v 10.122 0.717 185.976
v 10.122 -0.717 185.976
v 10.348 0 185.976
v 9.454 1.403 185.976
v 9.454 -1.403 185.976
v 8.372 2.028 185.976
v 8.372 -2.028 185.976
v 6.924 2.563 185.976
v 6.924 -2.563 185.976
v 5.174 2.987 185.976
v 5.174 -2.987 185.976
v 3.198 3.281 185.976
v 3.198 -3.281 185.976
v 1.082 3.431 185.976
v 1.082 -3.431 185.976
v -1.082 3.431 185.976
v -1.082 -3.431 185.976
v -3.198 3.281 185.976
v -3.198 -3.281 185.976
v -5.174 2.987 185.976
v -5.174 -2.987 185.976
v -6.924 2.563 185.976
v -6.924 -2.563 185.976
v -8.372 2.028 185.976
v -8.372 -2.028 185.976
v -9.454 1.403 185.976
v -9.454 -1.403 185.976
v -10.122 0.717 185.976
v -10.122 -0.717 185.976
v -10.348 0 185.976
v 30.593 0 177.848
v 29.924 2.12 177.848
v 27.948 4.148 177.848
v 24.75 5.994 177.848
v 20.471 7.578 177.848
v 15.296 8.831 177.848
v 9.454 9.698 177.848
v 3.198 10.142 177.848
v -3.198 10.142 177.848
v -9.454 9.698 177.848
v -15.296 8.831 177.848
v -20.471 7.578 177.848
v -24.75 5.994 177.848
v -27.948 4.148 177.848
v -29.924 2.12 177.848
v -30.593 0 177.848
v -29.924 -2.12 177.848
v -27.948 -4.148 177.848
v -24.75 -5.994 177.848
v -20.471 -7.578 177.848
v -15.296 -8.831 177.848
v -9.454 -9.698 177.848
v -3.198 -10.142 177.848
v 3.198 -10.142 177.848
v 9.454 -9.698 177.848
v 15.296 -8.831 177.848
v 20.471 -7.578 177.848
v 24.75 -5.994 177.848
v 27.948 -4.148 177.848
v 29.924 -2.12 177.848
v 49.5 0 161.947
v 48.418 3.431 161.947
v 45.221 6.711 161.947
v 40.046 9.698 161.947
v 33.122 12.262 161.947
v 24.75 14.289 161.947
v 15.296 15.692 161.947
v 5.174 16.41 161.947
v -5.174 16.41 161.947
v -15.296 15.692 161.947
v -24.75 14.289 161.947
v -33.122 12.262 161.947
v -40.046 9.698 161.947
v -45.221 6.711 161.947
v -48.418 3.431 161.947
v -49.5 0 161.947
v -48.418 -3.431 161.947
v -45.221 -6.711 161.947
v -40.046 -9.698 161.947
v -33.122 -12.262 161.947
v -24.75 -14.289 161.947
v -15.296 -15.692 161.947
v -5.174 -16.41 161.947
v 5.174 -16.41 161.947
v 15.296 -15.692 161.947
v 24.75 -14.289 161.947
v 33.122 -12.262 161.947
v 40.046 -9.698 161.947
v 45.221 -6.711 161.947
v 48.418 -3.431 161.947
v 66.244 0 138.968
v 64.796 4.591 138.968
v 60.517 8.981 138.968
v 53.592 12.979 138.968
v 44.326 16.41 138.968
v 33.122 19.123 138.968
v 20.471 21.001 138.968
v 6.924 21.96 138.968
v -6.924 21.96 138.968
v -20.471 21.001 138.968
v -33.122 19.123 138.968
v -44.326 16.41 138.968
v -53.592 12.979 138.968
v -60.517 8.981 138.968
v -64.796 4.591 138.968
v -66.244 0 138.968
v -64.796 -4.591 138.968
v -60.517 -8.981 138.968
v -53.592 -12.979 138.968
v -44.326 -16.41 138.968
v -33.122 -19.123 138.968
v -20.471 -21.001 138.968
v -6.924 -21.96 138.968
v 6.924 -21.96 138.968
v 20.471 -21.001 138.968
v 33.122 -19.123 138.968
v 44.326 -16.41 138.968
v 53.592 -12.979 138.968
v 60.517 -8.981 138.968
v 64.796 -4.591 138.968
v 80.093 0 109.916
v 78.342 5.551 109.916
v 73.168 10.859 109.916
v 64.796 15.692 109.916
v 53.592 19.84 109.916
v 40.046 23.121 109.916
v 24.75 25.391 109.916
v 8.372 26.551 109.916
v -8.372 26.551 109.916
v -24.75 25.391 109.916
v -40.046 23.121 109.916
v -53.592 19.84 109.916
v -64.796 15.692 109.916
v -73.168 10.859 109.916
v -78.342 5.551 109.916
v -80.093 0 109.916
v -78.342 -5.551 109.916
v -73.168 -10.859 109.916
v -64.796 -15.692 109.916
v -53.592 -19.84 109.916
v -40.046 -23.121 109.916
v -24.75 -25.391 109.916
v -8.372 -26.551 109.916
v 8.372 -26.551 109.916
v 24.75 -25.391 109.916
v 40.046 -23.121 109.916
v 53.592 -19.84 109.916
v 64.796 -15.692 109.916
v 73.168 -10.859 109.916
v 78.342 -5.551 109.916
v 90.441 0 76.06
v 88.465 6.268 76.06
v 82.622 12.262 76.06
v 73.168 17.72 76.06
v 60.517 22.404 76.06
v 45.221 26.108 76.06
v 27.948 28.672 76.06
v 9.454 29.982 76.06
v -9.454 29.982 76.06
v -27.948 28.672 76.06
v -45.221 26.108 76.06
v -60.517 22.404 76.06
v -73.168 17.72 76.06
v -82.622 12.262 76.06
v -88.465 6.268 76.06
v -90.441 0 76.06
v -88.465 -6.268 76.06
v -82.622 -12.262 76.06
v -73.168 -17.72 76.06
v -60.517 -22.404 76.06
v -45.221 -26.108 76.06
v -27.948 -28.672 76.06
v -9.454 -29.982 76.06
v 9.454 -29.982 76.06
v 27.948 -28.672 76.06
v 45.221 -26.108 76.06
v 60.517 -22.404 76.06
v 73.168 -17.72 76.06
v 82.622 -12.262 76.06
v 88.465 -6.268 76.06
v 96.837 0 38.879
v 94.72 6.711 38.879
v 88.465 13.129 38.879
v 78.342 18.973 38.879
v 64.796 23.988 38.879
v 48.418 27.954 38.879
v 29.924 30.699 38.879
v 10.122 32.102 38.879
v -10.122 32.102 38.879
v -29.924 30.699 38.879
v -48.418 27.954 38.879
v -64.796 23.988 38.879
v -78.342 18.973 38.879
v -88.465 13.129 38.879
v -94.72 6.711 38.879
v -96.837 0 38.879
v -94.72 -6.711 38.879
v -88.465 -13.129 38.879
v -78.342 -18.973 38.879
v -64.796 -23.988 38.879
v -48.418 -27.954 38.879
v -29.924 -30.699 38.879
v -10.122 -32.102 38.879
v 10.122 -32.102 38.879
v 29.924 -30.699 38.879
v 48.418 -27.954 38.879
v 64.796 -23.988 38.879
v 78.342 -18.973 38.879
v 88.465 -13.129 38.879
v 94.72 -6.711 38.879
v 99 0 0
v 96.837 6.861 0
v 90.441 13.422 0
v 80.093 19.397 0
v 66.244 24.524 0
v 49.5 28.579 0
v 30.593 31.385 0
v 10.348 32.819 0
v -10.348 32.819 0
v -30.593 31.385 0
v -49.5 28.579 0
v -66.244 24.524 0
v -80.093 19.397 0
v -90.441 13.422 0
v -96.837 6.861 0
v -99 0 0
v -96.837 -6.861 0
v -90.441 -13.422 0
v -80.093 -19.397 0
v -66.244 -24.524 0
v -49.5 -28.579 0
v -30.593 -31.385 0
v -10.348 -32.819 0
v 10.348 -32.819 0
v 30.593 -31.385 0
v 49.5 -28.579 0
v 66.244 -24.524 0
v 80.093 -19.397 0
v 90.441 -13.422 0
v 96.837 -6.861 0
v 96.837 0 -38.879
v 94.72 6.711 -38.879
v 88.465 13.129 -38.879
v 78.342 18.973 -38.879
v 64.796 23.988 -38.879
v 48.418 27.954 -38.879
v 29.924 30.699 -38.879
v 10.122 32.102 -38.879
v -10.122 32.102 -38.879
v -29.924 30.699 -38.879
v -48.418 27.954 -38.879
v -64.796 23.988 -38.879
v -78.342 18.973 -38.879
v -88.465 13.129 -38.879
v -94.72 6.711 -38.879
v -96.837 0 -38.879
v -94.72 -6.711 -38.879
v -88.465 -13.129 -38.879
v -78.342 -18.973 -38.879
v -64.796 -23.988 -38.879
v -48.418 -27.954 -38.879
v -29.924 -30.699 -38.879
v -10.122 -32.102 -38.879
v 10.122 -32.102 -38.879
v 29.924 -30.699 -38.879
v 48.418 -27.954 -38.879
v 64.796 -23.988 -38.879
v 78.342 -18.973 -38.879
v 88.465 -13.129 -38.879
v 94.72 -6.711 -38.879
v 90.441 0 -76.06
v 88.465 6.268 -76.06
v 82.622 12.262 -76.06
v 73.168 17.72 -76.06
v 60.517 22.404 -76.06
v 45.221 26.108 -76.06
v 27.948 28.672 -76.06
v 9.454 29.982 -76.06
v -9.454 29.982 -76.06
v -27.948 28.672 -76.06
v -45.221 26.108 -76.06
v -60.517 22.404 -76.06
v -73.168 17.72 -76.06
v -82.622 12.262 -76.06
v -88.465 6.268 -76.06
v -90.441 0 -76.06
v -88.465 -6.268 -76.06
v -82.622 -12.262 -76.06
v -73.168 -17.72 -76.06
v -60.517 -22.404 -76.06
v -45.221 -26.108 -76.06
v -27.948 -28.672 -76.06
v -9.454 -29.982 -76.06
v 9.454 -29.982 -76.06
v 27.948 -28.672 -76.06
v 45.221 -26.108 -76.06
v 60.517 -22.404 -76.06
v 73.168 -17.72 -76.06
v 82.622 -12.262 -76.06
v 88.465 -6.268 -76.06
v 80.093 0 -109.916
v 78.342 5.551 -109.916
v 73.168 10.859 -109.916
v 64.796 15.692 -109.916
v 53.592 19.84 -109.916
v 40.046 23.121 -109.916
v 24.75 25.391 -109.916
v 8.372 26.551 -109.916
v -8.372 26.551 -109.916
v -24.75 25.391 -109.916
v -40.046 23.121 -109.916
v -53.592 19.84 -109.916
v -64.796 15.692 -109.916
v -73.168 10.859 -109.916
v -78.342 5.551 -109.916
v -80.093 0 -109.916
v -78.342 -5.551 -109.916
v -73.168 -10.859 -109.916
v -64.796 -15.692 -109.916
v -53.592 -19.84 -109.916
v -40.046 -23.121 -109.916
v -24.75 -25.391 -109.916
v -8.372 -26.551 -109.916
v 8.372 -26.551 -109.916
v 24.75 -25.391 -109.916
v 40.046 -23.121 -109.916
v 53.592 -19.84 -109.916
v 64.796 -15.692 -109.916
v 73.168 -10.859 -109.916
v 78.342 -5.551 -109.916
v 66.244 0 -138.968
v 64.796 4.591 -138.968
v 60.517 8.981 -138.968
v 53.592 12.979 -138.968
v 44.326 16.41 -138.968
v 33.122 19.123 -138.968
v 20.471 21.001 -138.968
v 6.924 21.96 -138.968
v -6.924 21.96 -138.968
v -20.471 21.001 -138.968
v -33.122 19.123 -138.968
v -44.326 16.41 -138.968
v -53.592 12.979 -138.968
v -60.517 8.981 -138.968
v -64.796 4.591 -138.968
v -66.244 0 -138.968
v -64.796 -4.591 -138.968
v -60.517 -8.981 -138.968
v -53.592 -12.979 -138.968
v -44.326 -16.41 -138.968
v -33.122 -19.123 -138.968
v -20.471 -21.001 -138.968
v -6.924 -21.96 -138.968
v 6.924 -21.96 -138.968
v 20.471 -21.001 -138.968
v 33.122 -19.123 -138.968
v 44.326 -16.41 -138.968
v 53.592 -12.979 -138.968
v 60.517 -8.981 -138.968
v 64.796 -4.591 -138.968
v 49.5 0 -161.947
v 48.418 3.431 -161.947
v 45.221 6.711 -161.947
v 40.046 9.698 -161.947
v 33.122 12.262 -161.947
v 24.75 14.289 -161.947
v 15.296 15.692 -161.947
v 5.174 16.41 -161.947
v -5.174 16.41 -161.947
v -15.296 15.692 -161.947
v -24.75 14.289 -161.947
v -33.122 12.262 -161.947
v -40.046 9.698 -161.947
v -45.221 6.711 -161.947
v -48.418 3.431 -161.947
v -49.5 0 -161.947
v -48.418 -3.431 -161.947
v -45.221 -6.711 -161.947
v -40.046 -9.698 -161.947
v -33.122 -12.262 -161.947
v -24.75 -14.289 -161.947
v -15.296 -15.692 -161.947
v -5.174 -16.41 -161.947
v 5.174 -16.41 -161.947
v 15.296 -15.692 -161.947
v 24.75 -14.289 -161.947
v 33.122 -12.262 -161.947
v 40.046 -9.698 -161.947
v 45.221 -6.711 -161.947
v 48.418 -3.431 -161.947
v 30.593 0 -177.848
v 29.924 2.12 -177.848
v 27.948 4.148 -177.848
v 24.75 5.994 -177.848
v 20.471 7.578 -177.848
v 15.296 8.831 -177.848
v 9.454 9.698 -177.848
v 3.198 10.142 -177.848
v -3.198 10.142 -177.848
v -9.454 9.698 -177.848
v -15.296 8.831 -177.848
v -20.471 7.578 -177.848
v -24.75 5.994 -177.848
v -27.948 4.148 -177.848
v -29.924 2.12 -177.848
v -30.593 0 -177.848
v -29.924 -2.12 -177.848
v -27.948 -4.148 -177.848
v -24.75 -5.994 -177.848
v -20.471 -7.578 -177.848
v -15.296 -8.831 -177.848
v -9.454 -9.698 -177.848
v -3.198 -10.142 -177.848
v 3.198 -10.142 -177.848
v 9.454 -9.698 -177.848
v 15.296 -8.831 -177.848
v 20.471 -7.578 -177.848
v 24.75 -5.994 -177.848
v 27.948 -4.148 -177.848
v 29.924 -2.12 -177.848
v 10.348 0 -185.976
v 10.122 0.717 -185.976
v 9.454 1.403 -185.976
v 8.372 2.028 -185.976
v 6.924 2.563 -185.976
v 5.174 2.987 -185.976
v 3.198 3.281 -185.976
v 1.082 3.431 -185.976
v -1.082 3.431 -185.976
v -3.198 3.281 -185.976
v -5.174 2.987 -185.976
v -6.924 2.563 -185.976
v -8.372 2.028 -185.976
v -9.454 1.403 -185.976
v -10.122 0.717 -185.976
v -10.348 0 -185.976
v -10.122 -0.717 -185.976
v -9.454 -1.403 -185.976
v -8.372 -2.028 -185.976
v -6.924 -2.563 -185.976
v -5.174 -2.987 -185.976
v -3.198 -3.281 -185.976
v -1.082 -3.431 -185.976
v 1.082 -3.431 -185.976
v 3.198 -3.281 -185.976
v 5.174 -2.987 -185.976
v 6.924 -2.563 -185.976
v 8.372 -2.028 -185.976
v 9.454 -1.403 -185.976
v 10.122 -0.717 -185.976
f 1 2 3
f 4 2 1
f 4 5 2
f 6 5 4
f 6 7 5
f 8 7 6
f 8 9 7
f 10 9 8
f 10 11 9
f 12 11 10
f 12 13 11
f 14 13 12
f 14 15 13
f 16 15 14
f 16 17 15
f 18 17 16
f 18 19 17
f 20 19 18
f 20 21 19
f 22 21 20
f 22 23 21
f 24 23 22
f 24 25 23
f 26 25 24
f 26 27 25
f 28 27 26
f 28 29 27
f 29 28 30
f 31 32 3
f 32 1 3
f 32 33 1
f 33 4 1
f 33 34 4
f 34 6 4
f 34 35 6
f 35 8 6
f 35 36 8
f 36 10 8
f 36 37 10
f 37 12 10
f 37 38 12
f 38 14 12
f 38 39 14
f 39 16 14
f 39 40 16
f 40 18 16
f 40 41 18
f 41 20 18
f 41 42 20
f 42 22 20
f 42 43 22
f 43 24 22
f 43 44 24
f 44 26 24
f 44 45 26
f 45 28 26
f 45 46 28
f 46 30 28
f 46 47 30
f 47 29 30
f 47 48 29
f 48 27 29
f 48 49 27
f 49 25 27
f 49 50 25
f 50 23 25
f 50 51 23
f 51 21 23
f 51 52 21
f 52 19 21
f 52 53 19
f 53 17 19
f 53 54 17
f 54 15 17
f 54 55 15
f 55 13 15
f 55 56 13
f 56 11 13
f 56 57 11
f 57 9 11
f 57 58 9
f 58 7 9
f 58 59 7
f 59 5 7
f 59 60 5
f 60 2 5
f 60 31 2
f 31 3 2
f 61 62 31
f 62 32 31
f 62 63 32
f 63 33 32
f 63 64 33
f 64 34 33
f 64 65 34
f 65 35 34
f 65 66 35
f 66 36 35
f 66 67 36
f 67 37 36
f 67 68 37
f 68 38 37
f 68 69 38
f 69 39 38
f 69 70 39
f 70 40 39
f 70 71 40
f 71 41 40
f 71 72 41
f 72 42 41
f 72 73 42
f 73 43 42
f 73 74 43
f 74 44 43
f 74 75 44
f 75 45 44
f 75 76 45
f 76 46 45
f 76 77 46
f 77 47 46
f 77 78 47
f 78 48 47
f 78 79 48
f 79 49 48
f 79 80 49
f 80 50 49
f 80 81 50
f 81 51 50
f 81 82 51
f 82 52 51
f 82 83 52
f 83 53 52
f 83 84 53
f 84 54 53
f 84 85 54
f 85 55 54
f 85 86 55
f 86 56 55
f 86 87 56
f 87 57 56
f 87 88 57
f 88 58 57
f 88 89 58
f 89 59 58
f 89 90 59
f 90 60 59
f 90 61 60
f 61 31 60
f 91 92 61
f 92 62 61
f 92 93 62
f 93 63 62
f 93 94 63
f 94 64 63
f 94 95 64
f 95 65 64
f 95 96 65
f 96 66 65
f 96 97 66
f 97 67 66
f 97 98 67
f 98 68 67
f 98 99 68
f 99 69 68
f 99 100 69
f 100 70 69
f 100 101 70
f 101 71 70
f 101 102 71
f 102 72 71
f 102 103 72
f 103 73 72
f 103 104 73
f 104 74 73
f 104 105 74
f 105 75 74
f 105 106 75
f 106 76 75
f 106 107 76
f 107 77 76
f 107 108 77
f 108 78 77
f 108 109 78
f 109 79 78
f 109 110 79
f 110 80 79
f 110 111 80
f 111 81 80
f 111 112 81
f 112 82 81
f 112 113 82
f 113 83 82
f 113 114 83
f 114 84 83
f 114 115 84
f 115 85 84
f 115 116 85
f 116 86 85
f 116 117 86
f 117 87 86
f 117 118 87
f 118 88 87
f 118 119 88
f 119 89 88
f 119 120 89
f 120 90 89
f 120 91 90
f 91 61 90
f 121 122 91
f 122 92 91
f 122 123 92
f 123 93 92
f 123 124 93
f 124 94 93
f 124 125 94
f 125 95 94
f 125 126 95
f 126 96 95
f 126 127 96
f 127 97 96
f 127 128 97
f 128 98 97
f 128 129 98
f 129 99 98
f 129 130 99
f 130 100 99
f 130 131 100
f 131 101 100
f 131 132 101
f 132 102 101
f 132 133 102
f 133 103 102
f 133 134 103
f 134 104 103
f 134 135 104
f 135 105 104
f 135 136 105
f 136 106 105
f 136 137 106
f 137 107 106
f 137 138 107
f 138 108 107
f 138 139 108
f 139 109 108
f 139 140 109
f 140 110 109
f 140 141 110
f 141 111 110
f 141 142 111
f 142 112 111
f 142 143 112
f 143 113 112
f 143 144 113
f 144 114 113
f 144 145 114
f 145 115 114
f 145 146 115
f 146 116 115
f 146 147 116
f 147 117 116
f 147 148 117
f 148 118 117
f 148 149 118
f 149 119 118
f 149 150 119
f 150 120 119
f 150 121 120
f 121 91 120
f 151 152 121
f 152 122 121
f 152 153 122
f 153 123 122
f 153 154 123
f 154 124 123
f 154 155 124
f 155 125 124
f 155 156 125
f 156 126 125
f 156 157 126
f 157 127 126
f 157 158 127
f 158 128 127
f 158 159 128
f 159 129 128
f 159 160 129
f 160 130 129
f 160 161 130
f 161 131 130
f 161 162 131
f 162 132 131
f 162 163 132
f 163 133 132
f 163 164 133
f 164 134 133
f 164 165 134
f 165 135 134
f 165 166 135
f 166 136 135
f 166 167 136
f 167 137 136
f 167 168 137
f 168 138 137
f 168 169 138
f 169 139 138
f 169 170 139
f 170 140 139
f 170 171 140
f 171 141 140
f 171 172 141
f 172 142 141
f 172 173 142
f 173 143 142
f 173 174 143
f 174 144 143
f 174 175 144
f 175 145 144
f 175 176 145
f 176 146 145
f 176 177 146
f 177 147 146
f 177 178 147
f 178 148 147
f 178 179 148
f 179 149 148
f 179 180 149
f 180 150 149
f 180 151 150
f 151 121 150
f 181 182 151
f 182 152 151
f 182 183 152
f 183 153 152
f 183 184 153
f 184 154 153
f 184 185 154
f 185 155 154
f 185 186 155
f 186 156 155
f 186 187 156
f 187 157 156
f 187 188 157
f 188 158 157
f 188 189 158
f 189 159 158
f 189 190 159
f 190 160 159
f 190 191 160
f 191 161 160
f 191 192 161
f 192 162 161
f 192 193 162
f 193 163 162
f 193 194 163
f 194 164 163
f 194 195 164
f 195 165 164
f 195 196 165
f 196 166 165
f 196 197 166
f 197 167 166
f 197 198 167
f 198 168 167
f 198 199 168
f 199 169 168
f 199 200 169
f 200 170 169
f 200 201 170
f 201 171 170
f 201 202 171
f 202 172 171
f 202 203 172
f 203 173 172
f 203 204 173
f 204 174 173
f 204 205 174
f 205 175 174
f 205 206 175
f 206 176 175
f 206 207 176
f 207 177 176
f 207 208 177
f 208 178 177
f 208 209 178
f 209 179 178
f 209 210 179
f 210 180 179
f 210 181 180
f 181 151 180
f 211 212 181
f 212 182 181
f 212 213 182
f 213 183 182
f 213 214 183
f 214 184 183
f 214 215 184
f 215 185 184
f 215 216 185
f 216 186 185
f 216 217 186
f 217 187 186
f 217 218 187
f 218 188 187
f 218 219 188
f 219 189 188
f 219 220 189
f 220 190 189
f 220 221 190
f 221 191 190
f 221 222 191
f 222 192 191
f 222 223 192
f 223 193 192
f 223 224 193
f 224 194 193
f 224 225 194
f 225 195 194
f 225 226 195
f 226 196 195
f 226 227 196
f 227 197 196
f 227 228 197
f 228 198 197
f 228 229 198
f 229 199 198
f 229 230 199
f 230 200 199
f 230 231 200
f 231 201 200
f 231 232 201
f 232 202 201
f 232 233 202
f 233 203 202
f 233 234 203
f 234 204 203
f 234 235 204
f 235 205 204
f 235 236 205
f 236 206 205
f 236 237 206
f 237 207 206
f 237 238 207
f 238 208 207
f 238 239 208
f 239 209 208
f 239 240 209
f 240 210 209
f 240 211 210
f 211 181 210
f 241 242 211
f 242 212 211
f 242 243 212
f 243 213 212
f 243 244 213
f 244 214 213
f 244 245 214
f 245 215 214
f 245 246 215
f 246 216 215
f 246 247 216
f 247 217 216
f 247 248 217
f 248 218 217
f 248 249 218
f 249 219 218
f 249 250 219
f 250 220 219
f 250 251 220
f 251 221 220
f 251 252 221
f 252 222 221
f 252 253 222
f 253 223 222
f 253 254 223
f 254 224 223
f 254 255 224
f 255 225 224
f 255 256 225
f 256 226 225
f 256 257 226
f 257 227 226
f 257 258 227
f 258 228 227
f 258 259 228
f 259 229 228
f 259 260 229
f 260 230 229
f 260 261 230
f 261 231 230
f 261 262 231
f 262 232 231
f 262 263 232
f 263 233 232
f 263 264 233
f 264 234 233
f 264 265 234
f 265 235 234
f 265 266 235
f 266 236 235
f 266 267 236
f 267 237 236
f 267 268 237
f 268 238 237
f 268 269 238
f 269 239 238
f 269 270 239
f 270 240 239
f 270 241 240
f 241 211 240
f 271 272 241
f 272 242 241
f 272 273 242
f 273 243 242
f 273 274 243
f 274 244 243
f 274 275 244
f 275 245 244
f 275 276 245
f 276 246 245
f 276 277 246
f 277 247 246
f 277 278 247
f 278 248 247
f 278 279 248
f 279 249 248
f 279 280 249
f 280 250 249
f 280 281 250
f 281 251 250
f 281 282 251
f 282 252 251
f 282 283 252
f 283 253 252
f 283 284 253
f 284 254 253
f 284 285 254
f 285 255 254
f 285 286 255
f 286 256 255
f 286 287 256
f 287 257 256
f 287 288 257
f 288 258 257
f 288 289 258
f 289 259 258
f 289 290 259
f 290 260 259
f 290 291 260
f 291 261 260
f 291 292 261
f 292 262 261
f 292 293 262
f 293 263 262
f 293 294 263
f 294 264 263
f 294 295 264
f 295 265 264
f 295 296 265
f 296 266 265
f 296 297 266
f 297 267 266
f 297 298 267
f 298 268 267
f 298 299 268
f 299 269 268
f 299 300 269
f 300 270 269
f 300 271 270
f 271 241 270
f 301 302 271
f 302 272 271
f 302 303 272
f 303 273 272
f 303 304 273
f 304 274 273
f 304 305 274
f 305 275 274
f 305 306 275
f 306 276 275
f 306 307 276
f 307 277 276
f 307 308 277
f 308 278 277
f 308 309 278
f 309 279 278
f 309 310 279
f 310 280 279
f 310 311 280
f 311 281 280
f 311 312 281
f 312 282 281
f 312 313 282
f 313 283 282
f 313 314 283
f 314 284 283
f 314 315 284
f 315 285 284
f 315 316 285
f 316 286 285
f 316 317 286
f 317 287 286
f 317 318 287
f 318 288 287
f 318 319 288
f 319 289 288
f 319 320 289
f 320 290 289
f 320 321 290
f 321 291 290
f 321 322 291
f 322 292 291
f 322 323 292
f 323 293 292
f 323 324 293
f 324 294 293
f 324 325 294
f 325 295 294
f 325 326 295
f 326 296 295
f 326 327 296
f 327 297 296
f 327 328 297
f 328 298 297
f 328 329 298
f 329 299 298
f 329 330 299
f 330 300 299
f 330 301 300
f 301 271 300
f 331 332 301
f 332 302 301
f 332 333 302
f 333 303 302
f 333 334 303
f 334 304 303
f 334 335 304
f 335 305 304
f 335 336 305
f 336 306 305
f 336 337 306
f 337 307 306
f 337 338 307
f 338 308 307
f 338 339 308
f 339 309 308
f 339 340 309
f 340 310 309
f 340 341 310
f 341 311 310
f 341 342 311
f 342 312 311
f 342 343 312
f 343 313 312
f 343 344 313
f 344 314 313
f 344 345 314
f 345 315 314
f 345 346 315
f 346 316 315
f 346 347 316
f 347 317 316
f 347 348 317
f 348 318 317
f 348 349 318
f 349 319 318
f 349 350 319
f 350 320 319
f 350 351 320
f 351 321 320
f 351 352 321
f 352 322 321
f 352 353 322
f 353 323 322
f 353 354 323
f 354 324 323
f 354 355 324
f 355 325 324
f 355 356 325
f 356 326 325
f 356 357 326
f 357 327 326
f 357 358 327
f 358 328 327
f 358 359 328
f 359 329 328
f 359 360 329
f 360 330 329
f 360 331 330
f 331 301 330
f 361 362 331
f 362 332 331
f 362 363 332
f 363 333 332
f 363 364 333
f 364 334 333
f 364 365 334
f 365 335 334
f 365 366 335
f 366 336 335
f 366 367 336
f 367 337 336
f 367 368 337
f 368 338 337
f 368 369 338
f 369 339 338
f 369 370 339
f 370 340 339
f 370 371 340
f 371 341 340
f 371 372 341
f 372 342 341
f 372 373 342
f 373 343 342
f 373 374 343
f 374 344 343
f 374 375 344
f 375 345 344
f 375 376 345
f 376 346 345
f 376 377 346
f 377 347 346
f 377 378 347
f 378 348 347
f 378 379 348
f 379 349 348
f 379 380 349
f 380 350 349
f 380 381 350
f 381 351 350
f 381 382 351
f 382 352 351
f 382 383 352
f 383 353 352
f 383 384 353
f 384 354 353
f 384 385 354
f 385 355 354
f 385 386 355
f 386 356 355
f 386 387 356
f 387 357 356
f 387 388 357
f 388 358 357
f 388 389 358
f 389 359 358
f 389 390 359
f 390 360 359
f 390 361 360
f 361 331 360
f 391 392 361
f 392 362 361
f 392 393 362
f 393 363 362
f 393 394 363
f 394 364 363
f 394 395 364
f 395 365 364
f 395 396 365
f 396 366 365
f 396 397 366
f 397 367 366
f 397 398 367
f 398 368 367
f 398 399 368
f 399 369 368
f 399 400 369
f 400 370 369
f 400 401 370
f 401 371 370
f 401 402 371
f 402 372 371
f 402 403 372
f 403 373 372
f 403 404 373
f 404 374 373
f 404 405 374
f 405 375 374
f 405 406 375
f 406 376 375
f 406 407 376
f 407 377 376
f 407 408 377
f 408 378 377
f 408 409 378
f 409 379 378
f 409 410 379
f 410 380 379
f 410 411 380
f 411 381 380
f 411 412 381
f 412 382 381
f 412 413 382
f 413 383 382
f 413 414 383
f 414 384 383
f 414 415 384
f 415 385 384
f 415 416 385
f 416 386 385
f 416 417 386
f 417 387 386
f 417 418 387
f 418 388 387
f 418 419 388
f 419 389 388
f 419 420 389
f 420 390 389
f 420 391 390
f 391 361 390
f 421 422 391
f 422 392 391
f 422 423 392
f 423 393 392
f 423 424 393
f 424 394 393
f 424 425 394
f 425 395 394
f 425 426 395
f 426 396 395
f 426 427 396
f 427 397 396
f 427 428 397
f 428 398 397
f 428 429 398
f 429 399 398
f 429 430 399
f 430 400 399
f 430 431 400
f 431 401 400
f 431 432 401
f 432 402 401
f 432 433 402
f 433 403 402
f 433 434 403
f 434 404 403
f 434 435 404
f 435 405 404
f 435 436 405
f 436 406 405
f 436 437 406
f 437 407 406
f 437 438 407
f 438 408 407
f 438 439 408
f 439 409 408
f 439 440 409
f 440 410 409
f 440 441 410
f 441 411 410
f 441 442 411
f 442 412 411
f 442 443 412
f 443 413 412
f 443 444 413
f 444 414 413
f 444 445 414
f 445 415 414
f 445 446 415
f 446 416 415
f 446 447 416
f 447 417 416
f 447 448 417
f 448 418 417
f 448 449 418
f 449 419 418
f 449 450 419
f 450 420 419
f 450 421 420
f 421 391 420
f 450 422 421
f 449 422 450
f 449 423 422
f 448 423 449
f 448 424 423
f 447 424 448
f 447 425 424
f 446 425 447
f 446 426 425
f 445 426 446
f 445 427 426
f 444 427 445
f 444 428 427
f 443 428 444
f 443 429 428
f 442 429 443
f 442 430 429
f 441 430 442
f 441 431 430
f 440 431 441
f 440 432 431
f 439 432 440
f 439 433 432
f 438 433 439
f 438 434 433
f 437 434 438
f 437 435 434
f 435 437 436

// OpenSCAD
// Generated by SolidPython 1.0.1 on 2020-07-29 00:46:48


scale(v = [9, 3, 17]) {
	sphere(r = 11);
}
/***********************************************
*********      SolidPython code:      **********
************************************************
 
# import packages: SolidPython
from solid import *
from solid.utils import *
from itertools import chain, combinations, permutations


class Resize:

    def __init__(self, scad_file):
        self.scad_file = scad_file
        #self.scad_file = import_scad(scad_file)
        # cone/cylinder param:
        self.r1 = 0
        self.r2 = 0
        self.h = 0
        # rectangular prism param:
        self.w = 0
        self.l = 0
        # ellipse param:
        self.r = 0

    # import OpenScad code (file name corresponds to shape)


    # classify shape + parameters
    def assign(self, param1, param2, param3):
        if self.scad_file == 'cone.scad':
            self.r1 = param1
            self.r2 = param2
            self.h = param3
        elif self.scad_file == 'cylinder.scad':
            self.r1 = param1
            self.r2 = param2
            self.h = param3
        elif self.scad_file == 'rectangularPrism.scad':
            self.h = param1
            self.l = param2
            self.w = param3
        else:
            self.r = param1
            self.h = param2

    # resize parameters
    def iterate(self):
        x = range(3, 20, 2)
        i = 1
        if self.scad_file == 'cone.scad':
            tempList = list(permutations(x, 2))
            for temp in tempList:
                param1 = temp[0]
                param2 = temp[1]
                filepath = 'produced_scad_files/' + 'cone' + str(param1) + '_' + str(param2) + '_' + '.scad'
                scad_render_to_file(cylinder(h=param1, r1=param2, r2=0), filepath)

        elif self.scad_file == 'cylinder.scad':
            tempList = list(permutations(x, 3))
            for temp in tempList:
                param1 = temp[0]
                param2 = temp[1]
                filepath = 'produced_scad_files/' + 'cylinder' + str(param1) + '_' + str(param2) + '_' + '.scad'
                scad_render_to_file(cylinder(h=param1, r1=param2, r2=param2), filepath)

        elif self.scad_file == 'rectangularPrism.scad':
            tempList = list(permutations(x, 3))
            for temp in tempList:
                param1 = temp[0]
                param2 = temp[1]
                param3 = temp[2]
                filepath = 'produced_scad_files/' + 'rectangularPrism' + str(param1) + '_' + str(param2) + '_' + str(
                    param3) + '.scad'
                scad_render_to_file(cube(size=(param1, param2, param3)), filepath)

        elif self.scad_file == 'ellipse.scad':
            tempList = list(permutations(x, 4))
            for temp in tempList:
                param1 = temp[0]
                param2 = temp[1]
                param3 = temp[2]
                param4 = temp[3]
                filepath = 'produced_scad_files/' + 'ellipse' + str(param1) + '_' + str(param2) + '_' + str(param3) + '_' + str(param4) + '.scad'
                scad_render_to_file(scale([param1, param2, param3])(sphere(r=param4)), filepath)

    def render_to_scadfile(self):
        scad_render_to_file(scad, 'example.scad') 
 
************************************************/
